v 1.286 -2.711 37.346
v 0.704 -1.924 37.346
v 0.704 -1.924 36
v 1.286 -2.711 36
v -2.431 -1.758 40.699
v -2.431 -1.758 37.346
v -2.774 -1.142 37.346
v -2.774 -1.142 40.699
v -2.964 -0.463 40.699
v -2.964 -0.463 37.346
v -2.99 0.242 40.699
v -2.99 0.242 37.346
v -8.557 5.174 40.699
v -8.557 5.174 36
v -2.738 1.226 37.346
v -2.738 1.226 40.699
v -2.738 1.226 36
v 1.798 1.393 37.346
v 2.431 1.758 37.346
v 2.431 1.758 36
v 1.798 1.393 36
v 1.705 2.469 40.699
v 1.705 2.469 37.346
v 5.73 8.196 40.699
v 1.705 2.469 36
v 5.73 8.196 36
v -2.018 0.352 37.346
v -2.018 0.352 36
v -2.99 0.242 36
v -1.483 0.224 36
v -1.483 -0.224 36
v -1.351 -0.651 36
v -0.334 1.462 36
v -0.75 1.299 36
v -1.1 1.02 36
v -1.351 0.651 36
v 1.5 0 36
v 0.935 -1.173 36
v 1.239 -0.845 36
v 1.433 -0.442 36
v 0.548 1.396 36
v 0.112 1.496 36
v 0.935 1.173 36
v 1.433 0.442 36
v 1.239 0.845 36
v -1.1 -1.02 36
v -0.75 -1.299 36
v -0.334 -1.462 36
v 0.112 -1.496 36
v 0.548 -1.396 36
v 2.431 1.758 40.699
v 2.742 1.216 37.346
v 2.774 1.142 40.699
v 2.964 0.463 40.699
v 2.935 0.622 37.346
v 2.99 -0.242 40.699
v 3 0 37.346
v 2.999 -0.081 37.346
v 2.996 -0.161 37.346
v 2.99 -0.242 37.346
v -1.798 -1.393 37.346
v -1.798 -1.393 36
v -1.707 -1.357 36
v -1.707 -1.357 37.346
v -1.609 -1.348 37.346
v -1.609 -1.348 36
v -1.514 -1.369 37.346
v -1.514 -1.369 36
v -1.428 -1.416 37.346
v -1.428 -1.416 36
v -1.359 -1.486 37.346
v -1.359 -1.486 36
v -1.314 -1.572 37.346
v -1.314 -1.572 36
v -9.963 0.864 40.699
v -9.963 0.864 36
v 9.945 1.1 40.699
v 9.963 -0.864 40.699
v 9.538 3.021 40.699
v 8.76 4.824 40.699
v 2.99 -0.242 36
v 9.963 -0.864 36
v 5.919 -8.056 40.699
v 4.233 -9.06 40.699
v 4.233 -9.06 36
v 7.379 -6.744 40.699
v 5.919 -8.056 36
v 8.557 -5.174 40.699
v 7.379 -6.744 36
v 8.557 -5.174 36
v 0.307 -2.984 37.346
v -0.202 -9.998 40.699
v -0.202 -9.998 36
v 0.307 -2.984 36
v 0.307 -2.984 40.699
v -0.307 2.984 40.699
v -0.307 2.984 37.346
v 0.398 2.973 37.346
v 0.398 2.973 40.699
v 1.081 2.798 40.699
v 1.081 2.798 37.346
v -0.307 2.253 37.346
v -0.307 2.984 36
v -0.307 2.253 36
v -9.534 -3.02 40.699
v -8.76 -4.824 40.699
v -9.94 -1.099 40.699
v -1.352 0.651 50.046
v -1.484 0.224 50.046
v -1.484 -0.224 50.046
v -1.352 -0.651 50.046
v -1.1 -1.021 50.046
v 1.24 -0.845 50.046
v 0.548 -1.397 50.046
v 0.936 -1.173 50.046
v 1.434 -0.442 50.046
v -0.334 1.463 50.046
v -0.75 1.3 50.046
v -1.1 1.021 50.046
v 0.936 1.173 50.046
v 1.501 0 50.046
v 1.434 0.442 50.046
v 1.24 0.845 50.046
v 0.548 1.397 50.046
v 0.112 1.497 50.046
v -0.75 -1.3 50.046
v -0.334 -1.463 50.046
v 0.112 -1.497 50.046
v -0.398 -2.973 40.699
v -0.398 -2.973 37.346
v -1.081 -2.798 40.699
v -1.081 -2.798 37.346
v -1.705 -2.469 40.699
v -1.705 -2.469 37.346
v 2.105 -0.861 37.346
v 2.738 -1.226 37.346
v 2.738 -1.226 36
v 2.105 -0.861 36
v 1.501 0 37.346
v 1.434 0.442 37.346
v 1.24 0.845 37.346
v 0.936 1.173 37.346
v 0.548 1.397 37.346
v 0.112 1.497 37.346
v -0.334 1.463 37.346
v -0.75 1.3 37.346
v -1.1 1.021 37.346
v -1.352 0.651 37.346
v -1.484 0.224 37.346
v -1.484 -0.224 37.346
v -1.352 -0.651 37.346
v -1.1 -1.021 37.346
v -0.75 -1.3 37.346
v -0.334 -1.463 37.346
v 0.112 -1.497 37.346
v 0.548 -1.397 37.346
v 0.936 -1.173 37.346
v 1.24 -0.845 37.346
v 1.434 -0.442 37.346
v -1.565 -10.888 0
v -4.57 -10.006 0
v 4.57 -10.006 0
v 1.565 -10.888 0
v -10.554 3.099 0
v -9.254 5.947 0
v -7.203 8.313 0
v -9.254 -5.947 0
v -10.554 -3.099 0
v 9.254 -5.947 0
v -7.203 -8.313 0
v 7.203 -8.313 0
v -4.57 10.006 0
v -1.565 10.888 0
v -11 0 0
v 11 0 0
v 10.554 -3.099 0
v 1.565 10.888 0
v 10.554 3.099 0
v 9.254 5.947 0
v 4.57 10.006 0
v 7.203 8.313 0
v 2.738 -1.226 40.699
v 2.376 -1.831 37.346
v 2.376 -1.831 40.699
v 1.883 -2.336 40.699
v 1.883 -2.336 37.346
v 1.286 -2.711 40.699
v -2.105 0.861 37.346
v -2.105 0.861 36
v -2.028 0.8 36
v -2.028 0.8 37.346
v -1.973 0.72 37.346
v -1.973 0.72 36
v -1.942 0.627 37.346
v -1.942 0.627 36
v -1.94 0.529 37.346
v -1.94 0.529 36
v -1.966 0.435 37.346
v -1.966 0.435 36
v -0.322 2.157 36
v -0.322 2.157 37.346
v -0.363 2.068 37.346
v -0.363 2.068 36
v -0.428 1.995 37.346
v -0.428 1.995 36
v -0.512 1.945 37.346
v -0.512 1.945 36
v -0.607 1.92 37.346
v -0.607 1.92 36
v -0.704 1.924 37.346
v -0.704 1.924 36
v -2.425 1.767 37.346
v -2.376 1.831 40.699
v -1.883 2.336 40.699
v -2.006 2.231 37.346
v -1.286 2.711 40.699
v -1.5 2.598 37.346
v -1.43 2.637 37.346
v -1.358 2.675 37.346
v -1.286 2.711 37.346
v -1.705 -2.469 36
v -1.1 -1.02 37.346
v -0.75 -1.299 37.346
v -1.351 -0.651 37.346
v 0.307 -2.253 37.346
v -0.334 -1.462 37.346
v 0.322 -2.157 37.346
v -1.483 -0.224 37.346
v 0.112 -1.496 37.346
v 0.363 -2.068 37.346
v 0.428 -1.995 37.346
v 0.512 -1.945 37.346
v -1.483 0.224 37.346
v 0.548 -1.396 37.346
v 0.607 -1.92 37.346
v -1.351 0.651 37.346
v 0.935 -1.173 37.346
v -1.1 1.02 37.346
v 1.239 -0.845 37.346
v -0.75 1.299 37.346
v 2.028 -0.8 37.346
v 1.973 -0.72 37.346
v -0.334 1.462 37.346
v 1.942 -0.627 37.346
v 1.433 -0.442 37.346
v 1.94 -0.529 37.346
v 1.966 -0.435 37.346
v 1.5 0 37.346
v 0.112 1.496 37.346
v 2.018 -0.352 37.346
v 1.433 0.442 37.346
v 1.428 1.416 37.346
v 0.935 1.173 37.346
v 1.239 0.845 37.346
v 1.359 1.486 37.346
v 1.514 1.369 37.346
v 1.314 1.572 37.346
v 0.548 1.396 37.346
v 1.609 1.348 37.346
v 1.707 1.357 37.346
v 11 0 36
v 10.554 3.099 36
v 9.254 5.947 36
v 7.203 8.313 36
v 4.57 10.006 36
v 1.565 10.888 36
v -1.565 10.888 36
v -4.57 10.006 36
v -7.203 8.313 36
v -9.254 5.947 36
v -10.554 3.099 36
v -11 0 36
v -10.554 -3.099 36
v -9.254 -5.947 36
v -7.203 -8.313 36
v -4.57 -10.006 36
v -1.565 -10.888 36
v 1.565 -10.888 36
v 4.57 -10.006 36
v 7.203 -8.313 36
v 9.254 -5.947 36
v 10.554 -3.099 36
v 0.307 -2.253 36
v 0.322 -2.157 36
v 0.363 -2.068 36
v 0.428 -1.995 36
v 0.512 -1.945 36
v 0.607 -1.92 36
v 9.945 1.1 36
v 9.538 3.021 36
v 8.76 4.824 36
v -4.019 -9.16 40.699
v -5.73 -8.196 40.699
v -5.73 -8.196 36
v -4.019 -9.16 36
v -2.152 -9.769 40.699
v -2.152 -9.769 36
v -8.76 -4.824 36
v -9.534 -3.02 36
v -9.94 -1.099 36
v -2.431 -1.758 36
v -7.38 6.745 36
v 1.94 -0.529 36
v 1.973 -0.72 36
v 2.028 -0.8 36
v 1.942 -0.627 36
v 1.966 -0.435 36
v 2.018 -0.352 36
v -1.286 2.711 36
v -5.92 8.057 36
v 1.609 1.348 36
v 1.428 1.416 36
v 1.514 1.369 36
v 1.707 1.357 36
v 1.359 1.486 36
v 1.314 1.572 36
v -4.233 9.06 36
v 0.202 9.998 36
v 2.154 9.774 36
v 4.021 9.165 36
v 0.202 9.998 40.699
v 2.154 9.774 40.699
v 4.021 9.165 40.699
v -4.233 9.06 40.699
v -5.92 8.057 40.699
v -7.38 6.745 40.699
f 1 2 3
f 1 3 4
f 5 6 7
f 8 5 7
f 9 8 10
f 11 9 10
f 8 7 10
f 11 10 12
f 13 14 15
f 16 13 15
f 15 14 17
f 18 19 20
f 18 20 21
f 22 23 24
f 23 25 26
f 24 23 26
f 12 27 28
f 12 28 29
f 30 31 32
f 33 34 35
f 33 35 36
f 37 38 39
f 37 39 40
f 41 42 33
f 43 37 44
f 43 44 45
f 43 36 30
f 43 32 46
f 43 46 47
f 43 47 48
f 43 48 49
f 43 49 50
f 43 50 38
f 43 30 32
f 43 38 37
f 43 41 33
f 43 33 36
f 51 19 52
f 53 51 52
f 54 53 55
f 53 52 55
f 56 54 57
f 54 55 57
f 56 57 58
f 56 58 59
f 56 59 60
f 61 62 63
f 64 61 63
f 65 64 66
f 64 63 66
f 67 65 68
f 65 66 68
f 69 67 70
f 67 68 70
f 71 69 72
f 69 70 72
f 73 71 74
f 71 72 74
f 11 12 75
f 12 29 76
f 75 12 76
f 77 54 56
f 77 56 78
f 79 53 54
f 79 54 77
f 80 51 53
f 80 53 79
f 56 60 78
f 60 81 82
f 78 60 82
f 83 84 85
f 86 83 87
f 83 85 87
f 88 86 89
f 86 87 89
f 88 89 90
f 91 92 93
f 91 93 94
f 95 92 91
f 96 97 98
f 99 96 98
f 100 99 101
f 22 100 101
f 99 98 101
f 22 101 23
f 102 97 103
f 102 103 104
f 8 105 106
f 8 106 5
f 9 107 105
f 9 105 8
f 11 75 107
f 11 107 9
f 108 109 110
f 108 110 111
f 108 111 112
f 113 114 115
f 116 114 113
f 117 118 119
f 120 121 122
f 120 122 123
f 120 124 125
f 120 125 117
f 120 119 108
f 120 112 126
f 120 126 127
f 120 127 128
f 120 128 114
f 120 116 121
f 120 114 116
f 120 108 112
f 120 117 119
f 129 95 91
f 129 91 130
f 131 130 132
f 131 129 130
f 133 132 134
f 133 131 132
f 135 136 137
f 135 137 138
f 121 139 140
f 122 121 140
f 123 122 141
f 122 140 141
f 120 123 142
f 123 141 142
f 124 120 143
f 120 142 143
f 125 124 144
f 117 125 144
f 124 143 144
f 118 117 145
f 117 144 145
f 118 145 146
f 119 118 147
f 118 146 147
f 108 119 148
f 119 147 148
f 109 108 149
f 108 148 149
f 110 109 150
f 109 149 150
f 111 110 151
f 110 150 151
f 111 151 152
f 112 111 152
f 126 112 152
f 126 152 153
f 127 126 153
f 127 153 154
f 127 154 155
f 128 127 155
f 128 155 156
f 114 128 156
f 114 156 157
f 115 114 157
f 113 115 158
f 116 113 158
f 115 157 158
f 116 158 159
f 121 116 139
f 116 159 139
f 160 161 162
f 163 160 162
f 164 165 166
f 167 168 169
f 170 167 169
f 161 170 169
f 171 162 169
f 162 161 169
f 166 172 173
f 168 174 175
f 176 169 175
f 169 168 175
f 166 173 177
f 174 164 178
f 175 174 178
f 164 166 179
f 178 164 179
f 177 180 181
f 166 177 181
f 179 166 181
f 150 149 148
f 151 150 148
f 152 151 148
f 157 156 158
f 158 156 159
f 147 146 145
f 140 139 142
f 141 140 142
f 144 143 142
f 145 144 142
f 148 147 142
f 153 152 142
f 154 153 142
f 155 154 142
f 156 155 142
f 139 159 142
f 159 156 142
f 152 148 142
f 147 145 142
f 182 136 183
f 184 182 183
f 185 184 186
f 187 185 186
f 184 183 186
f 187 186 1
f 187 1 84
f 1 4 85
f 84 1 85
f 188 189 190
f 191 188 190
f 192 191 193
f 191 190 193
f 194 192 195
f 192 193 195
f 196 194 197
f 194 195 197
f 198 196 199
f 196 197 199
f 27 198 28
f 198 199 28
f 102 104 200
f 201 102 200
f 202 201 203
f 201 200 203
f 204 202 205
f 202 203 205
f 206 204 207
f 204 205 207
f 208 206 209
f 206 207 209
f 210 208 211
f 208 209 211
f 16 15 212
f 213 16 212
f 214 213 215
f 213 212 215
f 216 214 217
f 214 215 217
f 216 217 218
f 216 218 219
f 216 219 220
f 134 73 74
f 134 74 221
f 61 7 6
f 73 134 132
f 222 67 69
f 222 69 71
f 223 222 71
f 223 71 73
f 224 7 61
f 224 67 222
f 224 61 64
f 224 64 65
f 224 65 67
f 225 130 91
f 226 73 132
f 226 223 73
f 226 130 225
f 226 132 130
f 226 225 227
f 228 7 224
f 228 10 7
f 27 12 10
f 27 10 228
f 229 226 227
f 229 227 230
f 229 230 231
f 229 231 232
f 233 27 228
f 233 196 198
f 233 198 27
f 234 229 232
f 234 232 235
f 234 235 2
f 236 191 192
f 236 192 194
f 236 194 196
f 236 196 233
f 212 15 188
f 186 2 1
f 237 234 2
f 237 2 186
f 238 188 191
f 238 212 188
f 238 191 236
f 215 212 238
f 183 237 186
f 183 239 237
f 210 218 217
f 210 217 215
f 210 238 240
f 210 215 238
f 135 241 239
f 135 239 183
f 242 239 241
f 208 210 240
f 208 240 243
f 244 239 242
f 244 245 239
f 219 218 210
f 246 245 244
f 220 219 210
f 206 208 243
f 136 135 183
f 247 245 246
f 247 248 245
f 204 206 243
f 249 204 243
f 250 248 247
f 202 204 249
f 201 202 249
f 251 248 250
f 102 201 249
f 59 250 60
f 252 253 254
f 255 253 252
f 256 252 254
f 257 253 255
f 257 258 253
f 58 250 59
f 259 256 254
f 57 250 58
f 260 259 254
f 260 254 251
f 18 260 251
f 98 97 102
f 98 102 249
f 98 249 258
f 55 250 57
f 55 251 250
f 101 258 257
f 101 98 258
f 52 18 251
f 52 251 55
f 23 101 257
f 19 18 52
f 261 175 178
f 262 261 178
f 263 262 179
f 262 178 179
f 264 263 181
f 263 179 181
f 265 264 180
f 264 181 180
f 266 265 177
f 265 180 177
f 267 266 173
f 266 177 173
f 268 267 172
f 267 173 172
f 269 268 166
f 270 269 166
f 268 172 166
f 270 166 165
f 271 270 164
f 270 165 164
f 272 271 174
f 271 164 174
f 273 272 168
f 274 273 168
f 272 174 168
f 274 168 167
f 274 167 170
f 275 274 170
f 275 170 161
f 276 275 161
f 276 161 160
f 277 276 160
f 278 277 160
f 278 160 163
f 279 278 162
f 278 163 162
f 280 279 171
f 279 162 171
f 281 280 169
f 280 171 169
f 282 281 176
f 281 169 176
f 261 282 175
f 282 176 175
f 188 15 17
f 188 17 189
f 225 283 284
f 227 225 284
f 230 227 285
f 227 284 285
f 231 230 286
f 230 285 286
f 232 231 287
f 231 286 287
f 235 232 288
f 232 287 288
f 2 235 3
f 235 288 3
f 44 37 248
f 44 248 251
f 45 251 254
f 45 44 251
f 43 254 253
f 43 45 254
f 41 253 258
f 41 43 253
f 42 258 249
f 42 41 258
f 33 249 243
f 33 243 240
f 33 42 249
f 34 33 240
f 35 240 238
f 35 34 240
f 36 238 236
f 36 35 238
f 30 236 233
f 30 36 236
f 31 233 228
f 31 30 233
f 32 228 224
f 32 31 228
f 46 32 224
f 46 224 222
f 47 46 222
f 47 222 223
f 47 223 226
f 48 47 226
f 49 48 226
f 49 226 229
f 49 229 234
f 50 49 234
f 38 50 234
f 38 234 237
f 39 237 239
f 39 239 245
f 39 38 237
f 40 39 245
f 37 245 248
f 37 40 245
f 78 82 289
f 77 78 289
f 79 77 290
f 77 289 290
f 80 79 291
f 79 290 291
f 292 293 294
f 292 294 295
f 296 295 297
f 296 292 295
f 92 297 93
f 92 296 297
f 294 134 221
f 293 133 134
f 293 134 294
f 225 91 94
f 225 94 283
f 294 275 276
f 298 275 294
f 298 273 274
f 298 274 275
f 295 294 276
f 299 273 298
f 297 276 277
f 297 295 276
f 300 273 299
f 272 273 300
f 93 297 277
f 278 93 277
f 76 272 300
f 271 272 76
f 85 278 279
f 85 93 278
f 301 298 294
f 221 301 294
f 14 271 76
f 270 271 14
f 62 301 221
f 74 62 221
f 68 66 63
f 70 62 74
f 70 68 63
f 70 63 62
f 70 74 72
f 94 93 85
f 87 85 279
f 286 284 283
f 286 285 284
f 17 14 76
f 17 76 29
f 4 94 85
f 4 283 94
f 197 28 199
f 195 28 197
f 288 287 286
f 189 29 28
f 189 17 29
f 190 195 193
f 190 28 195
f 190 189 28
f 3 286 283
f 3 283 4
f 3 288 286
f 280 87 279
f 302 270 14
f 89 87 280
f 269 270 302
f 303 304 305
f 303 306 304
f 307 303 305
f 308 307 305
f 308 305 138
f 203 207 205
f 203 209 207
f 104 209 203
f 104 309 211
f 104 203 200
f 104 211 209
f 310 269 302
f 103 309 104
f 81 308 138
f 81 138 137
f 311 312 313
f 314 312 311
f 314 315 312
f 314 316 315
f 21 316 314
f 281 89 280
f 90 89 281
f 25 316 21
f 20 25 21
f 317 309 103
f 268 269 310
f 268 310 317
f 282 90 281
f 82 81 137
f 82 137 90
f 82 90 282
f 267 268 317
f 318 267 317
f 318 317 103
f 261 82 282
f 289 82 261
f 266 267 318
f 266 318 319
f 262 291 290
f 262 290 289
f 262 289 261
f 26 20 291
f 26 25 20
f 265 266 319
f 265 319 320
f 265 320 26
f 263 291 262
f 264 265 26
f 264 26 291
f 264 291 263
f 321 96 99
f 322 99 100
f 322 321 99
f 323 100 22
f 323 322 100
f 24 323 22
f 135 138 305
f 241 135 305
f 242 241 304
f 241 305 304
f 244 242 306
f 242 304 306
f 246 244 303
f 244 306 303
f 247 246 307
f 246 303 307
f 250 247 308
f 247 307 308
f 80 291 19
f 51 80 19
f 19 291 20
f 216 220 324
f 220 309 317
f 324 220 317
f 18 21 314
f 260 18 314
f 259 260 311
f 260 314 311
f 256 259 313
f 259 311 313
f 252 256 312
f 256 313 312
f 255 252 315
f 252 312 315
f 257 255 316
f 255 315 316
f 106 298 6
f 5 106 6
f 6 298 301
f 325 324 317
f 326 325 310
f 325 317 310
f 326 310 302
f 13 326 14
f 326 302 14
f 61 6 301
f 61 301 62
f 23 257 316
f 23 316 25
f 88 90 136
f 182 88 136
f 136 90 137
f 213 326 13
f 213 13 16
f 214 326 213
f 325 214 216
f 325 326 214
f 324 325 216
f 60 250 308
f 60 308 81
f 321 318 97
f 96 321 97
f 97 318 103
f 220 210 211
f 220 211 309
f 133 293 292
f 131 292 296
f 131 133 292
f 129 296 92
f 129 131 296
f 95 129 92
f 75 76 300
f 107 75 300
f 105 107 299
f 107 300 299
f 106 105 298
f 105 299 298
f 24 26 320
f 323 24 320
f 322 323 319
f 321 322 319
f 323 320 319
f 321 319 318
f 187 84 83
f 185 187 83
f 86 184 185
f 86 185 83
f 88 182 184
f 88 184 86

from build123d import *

# Parameters (mm, degrees)
F0_R     = 11
F1_DEPTH = 36
F2_R     = 1.5
F3_DEPTH = 1.3462
F5_R     = 1.5008527343
F6_DEPTH = 12.7
F8_DEPTH = 4.699


with BuildPart() as f1:
    # F0 (on Top) → F1 (new body)
    with BuildSketch(Plane.XY):
        Circle(F0_R)
    extrude(amount=F1_DEPTH)

    # F2 (on face) → F3 (join)
    with BuildSketch(Plane.XY.offset(36)):
        with BuildLine():
            ThreePointArc((1.7046152007, 2.4686609766), (0.7447190731, 2.906095921), (-0.3072532854, 2.984224425))
            Line((-0.3072532854, 2.984224425), (-0.3072532854, 2.2532741809))
            ThreePointArc((-0.3072532854, 2.2532741809), (-0.4284919948, 1.9952916114), (-0.704479753, 1.9239853136))
            Line((-0.704479753, 1.9239853136), (-1.2856155187, 2.7105705558))
            ThreePointArc((-1.2856155187, 2.7105705558), (-1.3939430401, 2.6564869285), (-1.5, 2.5980762114))
            ThreePointArc((-1.5, 2.5980762114), (-2.2273032861, 2.009756222), (-2.7380408053, 1.2260230619))
            Line((-2.7380408053, 1.2260230619), (-2.105019325, 0.8605479398))
            ThreePointArc((-2.105019325, 0.8605479398), (-1.9422192208, 0.6265608529), (-2.0184600346, 0.3518952942))
            Line((-2.0184600346, 0.3518952942), (-2.9902307194, 0.2419095792))
            ThreePointArc((-2.9902307194, 0.2419095792), (-2.88911243, -0.8081023245), (-2.4307875199, -1.7582013631))
            Line((-2.4307875199, -1.7582013631), (-1.7977660396, -1.392726241))
            ThreePointArc((-1.7977660396, -1.392726241), (-1.513727226, -1.3687307585), (-1.3139802816, -1.5720900194))
            Line((-1.3139802816, -1.5720900194), (-1.7046152007, -2.4686609766))
            ThreePointArc((-1.7046152007, -2.4686609766), (-0.7447190731, -2.906095921), (0.3072532854, -2.984224425))
            Line((0.3072532854, -2.984224425), (0.3072532854, -2.2532741809))
            ThreePointArc((0.3072532854, -2.2532741809), (0.4284919948, -1.9952916114), (0.704479753, -1.9239853136))
            Line((0.704479753, -1.9239853136), (1.2856155187, -2.7105705558))
            ThreePointArc((1.2856155187, -2.7105705558), (2.1443933569, -2.0979935965), (2.7380408053, -1.2260230619))
            Line((2.7380408053, -1.2260230619), (2.105019325, -0.8605479398))
            ThreePointArc((2.105019325, -0.8605479398), (1.9422192208, -0.6265608529), (2.0184600346, -0.3518952942))
            Line((2.0184600346, -0.3518952942), (2.9902307194, -0.2419095792))
            ThreePointArc((2.9902307194, -0.2419095792), (2.9975566849, -0.1210533801), (3, 0))
            ThreePointArc((3, 0), (2.8541515867, 0.9240231167), (2.4307875199, 1.7582013631))
            Line((2.4307875199, 1.7582013631), (1.7977660396, 1.392726241))
            ThreePointArc((1.7977660396, 1.392726241), (1.513727226, 1.3687307585), (1.3139802816, 1.5720900194))
            Line((1.3139802816, 1.5720900194), (1.7046152007, 2.4686609766))
        make_face()
        Circle(F2_R, mode=Mode.SUBTRACT)
    extrude(amount=F3_DEPTH)

    # F7 (on face) → F8 (join, symmetric)
    with BuildSketch(Plane.XY.offset(36)):
        with BuildLine():
            ThreePointArc((-2.4307875199, -1.7582013631), (-2.88911243, -0.8081023245), (-2.9902307194, 0.2419095792))
            Line((-2.9902307194, 0.2419095792), (-9.9625906409, 0.8641688039))
            ThreePointArc((-9.9625906409, 0.8641688039), (-9.7843590309, -2.0693330281), (-8.7596187693, -4.8238033766))
            Line((-8.7596187693, -4.8238033766), (-2.4307875199, -1.7582013631))
        make_face()
        with BuildLine():
            Line((0.2022731176, 9.99795407), (-0.3072532854, 2.984224425))
            ThreePointArc((-0.3072532854, 2.984224425), (0.7447190731, 2.906095921), (1.7046152007, 2.4686609766))
            Line((1.7046152007, 2.4686609766), (5.7296874578, 8.1957721806))
            ThreePointArc((5.7296874578, 8.1957721806), (3.1027108725, 9.5162251218), (0.2022731176, 9.99795407))
        make_face()
        with BuildLine():
            Line((8.7596187693, 4.8238033766), (2.4307875199, 1.7582013631))
            ThreePointArc((2.4307875199, 1.7582013631), (2.88911243, 0.8081023245), (2.9902307194, -0.2419095792))
            Line((2.9902307194, -0.2419095792), (9.9625906409, -0.8641688039))
            ThreePointArc((9.9625906409, -0.8641688039), (9.7892625878, 2.0703701008), (8.7596187693, 4.8238033766))
        make_face()
        with BuildLine():
            Line((8.5573456517, -5.1741506934), (2.7380408053, -1.2260230619))
            ThreePointArc((2.7380408053, -1.2260230619), (2.1443933569, -2.0979935965), (1.2856155187, -2.7105705558))
            Line((1.2856155187, -2.7105705558), (4.2329031831, -9.0599409845))
            ThreePointArc((4.2329031831, -9.0599409845), (6.6811343516, -7.4353423534), (8.5573456517, -5.1741506934))
        make_face()
        with BuildLine():
            ThreePointArc((-2.7380408053, 1.2260230619), (-2.1443933569, 2.0979935965), (-1.2856155187, 2.7105705558))
            Line((-1.2856155187, 2.7105705558), (-4.2329031831, 9.0599409845))
            ThreePointArc((-4.2329031831, 9.0599409845), (-6.6822968499, 7.4366360818), (-8.5573456517, 5.1741506934))
            Line((-8.5573456517, 5.1741506934), (-2.7380408053, 1.2260230619))
        make_face()
        with BuildLine():
            ThreePointArc((0.3072532854, -2.984224425), (-0.7447190731, -2.906095921), (-1.7046152007, -2.4686609766))
            Line((-1.7046152007, -2.4686609766), (-5.7296874578, -8.1957721806))
            ThreePointArc((-5.7296874578, -8.1957721806), (-3.1010075693, -9.5110009752), (-0.2022731176, -9.99795407))
            Line((-0.2022731176, -9.99795407), (0.3072532854, -2.984224425))
        make_face()
    extrude(amount=F8_DEPTH, both=True)


with BuildPart() as f6:
    # F5 (on face) → F6 (new body)
    with BuildSketch(Plane.XY.offset(37.3462)):
        Circle(F5_R)
    extrude(amount=F6_DEPTH)


solid = Compound([f1.part, f6.part])
